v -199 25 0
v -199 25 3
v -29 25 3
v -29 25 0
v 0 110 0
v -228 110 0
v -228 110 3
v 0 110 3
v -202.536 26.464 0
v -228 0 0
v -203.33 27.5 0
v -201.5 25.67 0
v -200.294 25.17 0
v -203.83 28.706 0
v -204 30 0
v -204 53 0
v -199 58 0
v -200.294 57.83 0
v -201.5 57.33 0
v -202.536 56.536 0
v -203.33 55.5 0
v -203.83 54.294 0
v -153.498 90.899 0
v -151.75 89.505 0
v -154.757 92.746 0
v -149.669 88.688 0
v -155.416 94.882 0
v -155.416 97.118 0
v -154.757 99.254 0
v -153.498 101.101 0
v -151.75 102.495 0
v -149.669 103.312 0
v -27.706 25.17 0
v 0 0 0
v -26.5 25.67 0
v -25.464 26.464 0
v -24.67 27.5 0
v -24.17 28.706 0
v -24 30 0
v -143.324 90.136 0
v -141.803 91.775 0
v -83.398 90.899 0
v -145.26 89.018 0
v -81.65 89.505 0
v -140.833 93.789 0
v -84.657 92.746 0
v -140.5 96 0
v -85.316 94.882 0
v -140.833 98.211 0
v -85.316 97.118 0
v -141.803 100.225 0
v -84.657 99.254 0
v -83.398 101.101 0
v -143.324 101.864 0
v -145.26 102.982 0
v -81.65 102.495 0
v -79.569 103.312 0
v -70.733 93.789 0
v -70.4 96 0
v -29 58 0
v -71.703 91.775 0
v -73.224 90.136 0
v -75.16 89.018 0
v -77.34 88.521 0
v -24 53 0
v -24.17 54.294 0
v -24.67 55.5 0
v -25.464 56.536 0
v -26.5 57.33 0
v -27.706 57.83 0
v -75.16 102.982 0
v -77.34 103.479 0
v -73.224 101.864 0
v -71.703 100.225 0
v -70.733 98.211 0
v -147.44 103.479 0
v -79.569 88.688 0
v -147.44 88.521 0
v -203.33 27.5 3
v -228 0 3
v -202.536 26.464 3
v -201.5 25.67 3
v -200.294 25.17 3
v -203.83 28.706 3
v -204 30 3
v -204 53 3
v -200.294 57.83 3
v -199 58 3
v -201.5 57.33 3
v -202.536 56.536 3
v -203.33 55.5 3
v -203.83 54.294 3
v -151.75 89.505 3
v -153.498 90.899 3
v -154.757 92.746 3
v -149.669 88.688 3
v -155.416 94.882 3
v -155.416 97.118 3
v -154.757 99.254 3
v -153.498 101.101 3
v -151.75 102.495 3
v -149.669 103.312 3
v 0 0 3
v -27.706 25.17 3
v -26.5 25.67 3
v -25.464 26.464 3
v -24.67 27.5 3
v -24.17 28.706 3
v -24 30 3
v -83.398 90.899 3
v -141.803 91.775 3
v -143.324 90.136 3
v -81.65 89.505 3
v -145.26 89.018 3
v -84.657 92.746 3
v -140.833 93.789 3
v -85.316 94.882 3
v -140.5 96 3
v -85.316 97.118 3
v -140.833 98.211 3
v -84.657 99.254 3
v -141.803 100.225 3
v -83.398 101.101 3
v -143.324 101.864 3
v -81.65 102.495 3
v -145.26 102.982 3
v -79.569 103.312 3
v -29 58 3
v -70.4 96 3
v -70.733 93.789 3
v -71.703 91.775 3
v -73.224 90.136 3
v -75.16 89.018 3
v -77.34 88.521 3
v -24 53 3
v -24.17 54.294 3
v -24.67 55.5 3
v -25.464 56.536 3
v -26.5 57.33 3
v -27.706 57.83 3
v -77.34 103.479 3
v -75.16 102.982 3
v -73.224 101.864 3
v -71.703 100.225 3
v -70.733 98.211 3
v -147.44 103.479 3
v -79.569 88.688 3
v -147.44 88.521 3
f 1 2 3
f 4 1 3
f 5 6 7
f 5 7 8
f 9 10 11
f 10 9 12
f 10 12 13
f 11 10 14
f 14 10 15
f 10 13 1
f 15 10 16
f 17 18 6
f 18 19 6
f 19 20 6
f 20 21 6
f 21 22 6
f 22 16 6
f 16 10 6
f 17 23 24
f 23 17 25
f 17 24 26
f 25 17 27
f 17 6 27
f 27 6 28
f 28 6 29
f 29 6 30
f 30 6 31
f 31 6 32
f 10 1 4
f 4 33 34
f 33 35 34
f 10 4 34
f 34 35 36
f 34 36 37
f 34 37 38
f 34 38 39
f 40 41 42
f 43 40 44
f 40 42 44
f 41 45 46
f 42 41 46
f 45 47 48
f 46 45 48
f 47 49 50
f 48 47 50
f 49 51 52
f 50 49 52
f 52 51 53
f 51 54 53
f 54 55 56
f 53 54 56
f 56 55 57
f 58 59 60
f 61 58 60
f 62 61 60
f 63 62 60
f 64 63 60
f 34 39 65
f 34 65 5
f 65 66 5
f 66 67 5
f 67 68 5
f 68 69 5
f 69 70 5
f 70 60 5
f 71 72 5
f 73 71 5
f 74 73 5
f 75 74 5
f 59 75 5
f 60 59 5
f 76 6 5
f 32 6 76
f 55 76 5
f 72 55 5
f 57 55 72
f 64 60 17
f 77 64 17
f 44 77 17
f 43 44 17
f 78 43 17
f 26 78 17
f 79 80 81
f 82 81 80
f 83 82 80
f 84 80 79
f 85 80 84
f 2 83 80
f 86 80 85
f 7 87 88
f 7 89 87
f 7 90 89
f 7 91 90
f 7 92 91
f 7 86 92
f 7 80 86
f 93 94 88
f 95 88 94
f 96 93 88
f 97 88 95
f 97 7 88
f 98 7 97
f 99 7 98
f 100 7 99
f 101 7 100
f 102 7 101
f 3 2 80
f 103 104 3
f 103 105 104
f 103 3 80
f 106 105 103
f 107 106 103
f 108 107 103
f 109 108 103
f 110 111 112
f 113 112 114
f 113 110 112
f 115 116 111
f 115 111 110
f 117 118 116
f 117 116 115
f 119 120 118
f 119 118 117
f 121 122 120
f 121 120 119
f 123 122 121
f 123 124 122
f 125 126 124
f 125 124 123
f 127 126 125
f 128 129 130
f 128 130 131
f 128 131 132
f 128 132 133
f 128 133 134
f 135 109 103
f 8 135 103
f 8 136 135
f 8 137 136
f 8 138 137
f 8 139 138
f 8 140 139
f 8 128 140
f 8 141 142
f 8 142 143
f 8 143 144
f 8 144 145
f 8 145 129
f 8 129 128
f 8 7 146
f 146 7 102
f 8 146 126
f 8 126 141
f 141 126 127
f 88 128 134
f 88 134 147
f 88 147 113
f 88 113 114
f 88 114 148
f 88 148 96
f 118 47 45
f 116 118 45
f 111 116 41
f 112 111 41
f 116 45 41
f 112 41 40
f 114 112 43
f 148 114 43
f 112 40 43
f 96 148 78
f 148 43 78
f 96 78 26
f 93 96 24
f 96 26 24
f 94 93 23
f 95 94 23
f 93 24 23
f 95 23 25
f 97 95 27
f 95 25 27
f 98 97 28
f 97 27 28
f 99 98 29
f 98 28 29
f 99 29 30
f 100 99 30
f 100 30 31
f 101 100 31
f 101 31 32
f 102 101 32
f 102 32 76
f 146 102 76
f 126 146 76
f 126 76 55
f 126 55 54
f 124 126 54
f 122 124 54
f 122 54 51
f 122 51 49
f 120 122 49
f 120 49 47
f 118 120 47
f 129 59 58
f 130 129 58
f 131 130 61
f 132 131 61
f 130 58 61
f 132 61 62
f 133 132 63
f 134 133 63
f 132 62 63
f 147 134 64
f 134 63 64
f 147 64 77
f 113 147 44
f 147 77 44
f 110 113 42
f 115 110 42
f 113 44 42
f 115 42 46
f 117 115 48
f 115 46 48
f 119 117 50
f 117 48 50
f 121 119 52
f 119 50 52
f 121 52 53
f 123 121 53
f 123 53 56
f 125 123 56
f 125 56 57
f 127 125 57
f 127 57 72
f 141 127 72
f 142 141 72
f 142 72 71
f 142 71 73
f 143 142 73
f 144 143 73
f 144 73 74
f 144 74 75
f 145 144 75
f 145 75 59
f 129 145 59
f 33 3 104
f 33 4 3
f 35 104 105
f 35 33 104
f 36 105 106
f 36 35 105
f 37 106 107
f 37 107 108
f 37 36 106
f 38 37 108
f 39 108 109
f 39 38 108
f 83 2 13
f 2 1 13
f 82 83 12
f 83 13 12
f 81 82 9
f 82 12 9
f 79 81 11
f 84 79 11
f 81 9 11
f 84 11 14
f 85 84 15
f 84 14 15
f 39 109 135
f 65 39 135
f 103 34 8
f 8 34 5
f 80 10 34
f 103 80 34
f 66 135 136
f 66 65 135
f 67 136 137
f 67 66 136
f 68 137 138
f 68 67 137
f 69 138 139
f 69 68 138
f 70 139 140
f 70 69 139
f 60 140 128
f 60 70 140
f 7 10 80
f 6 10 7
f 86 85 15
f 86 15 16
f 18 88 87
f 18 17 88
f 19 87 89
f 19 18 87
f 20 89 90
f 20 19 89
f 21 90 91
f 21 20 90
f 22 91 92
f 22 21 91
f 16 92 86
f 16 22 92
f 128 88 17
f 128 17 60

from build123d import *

# Parameters (mm, degrees)
F0_W     = 228
F0_H     = 110
F1_DEPTH = 3
F2_W     = 180
F2_H     = 33
F3_DEPTH = 25
F4_R     = 5
F5_R     = 7.5
F6_DEPTH = 25


with BuildPart() as f1:
    # F0 (on Top) → F1 (new body)
    with BuildSketch(Plane.XY):
        with Locations((-114, 55)):
            Rectangle(F0_W, F0_H)
    extrude(amount=F1_DEPTH)

    # F2 (on face) → F3 (cut)
    with BuildSketch(Plane.XY.offset(3)):
        with Locations((-114, 41.5)):
            Rectangle(F2_W, F2_H)
    extrude(amount=-F3_DEPTH, mode=Mode.SUBTRACT)

    # F4
    f4_edges = [f1.edges().sort_by_distance(p)[0] for p in [
        (-24, 25, 1.5),
        (-24, 58, 1.5),
        (-204, 58, 1.5),
        (-204, 25, 1.5),
    ]]
    fillet(f4_edges, radius=F4_R)

    # F5 (on face) → F6 (cut)
    with BuildSketch(Plane(origin=(0, 0, 0), x_dir=(1, 0, 0), z_dir=(0, 0, -1))):
        with Locations((-148, -96)):
            Circle(F5_R)
        with Locations((-77.9, -96)):
            Circle(F5_R)
    extrude(amount=-F6_DEPTH, mode=Mode.SUBTRACT)


solid = f1.part
